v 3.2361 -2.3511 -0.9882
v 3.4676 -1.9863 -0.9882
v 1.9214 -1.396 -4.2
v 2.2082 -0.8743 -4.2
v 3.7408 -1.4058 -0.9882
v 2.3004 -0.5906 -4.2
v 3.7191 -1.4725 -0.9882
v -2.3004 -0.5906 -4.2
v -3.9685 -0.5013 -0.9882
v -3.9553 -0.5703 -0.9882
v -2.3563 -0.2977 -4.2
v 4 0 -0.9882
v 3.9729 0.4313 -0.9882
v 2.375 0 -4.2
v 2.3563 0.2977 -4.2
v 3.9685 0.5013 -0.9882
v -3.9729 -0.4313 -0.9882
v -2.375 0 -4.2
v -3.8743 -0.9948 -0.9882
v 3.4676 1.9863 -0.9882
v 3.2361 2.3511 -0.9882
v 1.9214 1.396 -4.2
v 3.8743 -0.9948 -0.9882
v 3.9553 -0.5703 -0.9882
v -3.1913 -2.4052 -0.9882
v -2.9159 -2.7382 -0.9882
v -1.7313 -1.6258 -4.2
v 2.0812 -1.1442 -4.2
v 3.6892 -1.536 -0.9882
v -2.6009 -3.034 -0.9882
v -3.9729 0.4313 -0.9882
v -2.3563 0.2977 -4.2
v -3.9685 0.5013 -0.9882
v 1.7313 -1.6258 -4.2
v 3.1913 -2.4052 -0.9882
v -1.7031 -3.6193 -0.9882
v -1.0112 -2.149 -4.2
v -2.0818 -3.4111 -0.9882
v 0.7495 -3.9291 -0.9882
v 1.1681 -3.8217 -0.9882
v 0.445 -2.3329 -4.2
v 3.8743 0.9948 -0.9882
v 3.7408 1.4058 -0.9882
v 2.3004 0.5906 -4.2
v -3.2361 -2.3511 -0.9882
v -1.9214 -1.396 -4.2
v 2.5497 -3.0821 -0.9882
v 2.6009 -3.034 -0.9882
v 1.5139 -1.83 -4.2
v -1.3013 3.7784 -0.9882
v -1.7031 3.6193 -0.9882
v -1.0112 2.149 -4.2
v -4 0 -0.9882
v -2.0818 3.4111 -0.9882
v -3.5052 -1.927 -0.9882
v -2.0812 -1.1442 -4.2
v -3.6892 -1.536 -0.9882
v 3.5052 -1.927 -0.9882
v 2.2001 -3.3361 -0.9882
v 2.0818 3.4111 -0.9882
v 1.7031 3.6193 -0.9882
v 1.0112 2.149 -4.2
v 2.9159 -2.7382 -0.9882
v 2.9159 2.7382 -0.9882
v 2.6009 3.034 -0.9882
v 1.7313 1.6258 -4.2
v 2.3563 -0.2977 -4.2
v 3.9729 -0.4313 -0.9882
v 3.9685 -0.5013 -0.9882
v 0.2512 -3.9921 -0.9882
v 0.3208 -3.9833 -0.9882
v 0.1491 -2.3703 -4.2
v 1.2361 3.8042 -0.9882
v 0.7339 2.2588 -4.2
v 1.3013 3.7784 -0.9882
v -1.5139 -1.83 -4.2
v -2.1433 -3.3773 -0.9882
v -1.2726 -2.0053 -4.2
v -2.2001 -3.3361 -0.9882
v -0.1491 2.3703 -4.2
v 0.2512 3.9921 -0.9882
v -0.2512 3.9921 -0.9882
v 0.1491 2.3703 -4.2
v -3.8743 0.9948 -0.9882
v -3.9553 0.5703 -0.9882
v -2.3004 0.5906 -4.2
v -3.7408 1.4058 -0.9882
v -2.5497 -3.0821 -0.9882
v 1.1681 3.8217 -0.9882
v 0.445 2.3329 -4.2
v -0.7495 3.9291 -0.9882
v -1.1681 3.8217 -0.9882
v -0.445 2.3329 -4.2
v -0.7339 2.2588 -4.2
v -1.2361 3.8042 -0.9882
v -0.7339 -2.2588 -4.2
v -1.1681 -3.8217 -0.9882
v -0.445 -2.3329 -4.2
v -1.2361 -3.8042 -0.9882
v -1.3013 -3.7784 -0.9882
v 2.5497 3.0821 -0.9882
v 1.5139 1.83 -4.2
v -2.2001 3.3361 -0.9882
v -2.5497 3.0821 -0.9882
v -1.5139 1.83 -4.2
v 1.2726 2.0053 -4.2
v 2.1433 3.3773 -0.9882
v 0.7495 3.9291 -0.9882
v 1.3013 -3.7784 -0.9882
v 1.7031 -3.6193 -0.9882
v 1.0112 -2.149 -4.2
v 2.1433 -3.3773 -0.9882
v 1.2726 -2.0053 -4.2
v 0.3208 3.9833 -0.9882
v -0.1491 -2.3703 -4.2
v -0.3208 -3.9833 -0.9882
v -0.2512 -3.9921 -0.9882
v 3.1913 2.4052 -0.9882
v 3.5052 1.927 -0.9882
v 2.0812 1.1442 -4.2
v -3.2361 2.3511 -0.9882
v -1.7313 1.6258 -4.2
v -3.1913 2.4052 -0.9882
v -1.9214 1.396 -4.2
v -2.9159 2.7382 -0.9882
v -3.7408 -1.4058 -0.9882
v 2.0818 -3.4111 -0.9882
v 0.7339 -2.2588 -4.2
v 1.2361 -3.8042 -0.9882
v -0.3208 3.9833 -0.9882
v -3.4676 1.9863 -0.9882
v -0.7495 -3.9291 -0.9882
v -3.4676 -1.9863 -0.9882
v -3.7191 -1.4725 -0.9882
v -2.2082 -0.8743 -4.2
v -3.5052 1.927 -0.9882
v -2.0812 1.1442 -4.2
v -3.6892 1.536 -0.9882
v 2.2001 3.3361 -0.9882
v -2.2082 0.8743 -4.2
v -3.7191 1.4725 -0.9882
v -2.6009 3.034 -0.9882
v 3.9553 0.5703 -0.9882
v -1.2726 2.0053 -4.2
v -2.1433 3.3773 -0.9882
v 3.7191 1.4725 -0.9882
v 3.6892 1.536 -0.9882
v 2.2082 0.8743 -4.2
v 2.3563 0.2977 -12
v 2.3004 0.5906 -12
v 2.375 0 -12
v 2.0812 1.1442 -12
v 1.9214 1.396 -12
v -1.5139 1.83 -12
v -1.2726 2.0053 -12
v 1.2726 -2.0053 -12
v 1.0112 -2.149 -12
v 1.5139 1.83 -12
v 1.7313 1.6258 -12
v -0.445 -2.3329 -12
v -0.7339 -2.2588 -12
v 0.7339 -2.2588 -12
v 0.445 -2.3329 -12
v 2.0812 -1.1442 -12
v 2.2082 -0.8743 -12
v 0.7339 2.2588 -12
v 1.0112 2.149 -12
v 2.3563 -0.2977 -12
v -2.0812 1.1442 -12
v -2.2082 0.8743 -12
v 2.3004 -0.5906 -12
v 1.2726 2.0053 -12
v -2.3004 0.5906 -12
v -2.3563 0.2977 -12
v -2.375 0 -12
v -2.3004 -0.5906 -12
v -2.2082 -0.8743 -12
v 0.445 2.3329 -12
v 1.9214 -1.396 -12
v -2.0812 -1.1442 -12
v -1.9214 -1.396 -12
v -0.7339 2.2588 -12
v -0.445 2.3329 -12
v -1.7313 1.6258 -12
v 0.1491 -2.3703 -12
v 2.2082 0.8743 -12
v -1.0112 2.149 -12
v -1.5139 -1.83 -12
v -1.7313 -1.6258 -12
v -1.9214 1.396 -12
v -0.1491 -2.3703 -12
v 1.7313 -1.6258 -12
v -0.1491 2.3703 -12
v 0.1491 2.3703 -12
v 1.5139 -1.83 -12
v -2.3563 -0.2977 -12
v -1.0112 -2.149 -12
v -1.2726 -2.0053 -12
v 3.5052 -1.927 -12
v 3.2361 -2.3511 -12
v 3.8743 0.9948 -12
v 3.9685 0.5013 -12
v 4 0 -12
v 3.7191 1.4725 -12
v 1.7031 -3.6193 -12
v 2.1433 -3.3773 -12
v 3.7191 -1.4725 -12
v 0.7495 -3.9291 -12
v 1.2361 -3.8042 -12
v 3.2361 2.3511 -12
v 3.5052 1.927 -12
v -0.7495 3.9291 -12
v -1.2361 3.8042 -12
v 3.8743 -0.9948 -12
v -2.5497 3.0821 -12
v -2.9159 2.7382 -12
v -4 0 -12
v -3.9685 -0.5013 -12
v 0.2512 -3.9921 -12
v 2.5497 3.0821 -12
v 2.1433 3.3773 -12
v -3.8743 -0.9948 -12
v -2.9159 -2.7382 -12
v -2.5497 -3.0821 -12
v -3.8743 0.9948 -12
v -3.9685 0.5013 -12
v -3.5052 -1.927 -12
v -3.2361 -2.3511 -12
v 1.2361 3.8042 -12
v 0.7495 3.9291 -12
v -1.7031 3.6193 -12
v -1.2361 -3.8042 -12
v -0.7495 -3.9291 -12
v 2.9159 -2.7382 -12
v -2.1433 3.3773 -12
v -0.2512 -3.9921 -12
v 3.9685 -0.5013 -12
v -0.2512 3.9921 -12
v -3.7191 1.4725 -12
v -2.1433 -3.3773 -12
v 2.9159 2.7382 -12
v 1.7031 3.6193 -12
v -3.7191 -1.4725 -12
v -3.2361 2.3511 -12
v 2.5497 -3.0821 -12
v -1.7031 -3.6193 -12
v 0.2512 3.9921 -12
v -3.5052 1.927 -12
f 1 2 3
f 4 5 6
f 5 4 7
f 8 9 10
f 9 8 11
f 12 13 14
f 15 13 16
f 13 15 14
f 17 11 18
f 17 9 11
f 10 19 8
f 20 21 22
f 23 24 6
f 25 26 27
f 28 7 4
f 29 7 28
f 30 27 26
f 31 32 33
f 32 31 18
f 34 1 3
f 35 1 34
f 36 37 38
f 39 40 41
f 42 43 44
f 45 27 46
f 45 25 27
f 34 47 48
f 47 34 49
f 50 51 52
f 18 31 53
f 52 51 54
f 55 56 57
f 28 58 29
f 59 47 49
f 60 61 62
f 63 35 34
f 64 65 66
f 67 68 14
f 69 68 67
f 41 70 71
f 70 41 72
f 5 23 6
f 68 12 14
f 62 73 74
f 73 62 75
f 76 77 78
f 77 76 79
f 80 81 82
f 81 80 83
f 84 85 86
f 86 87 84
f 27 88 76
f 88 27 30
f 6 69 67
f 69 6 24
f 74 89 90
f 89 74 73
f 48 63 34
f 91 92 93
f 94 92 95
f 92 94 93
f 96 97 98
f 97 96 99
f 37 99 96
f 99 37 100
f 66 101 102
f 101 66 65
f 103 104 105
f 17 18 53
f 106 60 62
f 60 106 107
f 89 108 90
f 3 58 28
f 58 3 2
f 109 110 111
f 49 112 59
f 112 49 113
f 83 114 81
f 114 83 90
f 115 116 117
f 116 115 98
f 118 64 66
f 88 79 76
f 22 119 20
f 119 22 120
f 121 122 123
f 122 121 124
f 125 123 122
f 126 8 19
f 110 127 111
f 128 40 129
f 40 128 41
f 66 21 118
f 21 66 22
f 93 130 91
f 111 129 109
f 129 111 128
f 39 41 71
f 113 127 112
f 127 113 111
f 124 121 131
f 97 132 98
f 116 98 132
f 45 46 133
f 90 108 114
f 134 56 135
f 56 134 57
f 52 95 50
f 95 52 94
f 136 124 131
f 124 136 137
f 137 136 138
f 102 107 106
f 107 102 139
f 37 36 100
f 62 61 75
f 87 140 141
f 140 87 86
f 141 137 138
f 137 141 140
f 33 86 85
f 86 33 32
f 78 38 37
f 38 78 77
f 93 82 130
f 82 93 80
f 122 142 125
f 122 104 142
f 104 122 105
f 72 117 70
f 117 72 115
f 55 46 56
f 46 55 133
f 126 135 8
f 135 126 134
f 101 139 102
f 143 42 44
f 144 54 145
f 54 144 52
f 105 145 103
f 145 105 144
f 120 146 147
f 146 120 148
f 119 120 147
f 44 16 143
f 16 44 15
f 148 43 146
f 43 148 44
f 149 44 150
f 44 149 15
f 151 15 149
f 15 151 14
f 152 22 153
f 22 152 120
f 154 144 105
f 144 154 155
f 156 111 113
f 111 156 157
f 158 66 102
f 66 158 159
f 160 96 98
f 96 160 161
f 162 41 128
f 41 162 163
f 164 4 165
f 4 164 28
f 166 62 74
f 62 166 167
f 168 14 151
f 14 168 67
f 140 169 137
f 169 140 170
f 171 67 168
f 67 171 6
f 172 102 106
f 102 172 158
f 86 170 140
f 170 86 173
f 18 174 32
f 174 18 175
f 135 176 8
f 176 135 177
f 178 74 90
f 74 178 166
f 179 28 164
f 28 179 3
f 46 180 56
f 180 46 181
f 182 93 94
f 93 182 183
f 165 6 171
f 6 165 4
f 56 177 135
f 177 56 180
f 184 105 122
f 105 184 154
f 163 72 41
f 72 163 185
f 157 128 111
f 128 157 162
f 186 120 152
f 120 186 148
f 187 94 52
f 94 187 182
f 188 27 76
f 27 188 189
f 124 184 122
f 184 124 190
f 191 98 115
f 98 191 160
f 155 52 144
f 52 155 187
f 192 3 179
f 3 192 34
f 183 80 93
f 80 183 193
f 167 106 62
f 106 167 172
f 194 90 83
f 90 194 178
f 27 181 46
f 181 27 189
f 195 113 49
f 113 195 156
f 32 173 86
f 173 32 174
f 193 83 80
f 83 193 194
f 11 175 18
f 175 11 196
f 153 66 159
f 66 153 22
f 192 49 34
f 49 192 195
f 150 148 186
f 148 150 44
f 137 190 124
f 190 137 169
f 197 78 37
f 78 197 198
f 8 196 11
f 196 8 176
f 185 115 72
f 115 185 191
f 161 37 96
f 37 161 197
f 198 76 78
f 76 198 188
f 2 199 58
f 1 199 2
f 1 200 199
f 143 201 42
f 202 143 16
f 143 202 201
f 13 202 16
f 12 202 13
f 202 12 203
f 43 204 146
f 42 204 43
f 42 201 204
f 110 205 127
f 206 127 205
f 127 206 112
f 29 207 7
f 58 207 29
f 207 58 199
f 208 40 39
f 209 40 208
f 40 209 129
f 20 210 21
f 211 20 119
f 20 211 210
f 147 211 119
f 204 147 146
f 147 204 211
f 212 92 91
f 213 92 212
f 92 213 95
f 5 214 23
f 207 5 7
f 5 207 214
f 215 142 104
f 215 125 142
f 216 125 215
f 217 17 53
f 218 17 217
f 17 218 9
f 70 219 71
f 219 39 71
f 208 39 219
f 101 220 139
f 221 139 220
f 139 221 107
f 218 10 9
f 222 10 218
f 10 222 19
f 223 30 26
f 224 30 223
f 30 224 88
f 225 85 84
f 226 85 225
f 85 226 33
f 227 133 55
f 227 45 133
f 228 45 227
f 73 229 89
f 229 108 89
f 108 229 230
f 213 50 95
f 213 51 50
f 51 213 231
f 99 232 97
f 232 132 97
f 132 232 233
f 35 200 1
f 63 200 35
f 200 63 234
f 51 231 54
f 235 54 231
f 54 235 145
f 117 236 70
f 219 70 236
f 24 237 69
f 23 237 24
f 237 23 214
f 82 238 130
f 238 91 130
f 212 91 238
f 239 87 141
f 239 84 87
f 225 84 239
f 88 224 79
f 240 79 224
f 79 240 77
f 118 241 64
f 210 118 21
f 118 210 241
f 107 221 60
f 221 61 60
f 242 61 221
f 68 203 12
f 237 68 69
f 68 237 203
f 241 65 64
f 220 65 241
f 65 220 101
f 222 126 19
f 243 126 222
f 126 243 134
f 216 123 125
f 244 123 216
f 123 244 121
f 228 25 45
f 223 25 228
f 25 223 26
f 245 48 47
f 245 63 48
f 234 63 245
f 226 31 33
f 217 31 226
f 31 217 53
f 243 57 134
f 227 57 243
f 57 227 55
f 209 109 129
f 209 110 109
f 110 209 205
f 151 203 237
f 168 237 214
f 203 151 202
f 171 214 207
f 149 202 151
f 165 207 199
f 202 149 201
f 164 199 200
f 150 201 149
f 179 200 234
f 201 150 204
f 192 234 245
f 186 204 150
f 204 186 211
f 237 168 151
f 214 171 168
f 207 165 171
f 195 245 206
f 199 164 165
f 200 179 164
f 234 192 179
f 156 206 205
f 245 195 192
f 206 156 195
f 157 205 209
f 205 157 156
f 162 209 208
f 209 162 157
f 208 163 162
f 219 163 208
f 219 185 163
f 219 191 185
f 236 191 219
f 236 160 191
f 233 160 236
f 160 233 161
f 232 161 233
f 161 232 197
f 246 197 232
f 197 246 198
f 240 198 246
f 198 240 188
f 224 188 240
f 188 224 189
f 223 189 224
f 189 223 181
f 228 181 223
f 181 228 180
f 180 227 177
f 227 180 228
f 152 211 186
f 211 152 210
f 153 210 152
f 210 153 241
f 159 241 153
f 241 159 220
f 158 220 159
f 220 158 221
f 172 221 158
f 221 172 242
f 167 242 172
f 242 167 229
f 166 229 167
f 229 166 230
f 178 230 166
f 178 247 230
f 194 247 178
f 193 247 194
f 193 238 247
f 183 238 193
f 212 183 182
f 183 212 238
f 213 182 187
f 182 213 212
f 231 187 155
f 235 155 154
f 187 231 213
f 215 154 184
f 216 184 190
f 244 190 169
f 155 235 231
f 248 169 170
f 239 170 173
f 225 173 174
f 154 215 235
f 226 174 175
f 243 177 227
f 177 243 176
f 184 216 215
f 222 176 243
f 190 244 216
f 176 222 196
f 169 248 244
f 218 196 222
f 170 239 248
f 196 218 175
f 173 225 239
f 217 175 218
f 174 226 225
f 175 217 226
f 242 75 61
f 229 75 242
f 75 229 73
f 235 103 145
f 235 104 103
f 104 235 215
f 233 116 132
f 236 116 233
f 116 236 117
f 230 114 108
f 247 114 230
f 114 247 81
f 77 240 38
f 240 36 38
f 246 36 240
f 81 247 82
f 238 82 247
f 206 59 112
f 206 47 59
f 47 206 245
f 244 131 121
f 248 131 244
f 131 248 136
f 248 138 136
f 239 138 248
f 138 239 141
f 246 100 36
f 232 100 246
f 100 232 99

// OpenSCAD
$fn = 50;

difference() {
	union() {
		translate(v = [0, 0, -12.0]) {
			cylinder(h = 15, r = 4.0);
		}
	}
	union() {
		translate(v = [0, 0, 0]) {
			rotate(a = [0, 0, 0]) {
				difference() {
					union() {
						translate(v = [0, 0, -15.0]) {
							cylinder(h = 15, r = 2.25);
						}
						translate(v = [0, 0, -4.2]) {
							cylinder(h = 4.2, r1 = 2.375, r2 = 4.5);
						}
						translate(v = [0, 0, -15.0]) {
							cylinder(h = 15, r = 2.375);
						}
						translate(v = [0, 0, -15.0]) {
							cylinder(h = 15, r = 2.25);
						}
					}
					union();
				}
			}
		}
		#cylinder(h = 3, r = 5.0);
	}
}
